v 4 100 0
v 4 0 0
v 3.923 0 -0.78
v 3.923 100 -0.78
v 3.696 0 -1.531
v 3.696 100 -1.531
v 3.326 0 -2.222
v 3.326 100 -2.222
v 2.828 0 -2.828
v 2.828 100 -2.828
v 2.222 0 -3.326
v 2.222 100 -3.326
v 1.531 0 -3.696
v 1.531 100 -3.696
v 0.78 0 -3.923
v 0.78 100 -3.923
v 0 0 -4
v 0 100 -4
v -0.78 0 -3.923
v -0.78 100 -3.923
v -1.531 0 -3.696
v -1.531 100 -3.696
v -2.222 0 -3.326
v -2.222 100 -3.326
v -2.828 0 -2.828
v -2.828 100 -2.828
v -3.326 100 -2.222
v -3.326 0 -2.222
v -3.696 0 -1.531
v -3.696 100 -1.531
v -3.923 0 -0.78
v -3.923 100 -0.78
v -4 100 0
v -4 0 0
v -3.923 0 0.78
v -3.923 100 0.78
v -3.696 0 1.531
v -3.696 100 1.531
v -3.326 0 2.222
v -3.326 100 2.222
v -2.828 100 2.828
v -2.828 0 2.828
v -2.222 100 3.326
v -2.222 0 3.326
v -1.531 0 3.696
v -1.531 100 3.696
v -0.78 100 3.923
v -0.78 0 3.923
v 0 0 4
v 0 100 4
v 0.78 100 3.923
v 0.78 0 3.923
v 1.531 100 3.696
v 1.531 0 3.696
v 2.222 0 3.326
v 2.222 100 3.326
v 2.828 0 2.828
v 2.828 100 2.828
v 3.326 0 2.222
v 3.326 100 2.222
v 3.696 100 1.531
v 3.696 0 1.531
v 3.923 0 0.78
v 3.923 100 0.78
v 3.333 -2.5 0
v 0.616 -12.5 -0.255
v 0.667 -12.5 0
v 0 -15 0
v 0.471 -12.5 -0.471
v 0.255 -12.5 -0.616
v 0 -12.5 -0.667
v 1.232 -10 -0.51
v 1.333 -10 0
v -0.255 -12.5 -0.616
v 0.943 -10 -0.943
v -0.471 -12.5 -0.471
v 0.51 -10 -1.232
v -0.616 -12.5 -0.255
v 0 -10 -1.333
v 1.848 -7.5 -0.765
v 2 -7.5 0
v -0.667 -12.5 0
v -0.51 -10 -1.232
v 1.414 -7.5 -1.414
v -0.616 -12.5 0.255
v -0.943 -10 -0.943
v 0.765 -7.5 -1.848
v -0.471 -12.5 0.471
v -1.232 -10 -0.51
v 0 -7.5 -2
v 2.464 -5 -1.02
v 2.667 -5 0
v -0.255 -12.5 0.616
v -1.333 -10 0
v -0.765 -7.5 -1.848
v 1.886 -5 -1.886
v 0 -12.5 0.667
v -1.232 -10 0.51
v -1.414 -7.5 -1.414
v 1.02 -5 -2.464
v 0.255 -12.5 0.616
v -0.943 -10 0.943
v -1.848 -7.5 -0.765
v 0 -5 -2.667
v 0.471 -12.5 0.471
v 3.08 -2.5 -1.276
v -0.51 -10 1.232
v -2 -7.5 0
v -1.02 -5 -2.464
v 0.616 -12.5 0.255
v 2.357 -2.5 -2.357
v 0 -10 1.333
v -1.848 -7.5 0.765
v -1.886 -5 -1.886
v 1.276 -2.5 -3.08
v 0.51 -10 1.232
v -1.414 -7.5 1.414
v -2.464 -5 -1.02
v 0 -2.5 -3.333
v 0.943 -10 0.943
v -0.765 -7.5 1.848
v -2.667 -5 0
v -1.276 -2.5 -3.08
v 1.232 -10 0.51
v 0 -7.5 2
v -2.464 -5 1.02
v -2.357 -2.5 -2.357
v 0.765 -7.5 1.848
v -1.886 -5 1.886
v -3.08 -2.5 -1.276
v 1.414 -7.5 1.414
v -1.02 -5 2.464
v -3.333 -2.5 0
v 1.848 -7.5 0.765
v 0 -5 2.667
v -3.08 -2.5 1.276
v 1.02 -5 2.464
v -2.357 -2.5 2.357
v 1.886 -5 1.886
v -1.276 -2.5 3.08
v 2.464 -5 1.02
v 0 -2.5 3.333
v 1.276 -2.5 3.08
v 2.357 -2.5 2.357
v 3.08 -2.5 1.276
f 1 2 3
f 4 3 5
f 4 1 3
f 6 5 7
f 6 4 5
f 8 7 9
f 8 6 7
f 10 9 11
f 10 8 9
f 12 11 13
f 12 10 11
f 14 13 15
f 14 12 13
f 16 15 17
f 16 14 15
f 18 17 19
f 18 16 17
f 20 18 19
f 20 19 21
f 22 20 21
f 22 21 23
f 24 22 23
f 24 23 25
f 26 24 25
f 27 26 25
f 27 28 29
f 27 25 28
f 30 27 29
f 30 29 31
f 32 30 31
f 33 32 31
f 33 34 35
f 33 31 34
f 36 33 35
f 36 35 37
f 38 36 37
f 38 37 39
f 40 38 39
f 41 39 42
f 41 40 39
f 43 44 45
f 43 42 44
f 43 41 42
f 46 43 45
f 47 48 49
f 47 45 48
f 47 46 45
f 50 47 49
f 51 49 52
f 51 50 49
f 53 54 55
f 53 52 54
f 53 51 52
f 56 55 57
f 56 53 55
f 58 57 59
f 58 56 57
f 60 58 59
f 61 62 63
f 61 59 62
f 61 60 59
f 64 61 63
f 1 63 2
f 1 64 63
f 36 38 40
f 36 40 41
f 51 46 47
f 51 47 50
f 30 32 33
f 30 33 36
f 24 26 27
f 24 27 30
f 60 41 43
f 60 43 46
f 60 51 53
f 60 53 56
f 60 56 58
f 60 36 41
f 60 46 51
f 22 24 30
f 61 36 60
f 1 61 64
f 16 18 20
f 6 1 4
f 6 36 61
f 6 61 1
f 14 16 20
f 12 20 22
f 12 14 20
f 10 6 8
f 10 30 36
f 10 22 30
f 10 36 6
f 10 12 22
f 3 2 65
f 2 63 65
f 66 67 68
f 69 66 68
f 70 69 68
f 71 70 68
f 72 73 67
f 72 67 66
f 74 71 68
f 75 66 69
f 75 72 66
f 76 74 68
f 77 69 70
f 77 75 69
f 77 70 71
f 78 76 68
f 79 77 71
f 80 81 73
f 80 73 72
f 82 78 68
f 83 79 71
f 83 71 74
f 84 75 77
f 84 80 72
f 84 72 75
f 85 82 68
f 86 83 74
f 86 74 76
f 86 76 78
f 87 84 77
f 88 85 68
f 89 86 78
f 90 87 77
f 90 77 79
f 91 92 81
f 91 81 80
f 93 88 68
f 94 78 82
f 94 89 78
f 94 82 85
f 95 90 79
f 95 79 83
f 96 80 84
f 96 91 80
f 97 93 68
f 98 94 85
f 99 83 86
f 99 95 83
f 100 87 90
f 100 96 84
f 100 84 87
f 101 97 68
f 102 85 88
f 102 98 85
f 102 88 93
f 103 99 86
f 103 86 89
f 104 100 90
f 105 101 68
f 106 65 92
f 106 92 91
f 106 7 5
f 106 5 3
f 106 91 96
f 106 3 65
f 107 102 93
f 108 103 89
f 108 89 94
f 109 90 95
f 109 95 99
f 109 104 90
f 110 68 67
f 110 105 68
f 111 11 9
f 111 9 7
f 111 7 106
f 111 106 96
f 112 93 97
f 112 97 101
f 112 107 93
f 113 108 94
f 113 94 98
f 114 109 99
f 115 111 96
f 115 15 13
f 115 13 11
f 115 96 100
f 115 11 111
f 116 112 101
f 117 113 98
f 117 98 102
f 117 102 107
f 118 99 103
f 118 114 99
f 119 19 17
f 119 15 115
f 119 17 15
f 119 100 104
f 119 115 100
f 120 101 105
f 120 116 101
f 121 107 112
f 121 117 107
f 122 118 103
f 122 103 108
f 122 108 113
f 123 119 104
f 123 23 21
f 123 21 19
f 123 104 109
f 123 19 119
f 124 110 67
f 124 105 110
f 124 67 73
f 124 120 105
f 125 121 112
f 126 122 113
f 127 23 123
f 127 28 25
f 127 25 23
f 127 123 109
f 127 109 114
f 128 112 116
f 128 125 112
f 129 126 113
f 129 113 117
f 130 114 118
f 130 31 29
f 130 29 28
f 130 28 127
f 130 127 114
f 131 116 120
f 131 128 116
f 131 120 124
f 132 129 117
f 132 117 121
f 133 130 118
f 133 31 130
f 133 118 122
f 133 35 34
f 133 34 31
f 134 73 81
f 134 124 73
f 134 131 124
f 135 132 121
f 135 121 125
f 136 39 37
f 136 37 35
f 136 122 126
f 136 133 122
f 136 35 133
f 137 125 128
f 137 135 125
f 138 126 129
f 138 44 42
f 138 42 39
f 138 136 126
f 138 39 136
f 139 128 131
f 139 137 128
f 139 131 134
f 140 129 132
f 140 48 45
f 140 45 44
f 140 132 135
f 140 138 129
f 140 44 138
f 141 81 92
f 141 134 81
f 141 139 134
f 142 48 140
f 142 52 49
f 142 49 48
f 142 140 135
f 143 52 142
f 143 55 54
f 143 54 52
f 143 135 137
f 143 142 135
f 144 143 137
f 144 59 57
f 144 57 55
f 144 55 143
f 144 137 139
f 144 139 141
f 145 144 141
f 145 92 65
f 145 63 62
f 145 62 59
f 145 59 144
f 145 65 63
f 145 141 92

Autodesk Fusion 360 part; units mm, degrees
sketch "草图1" plane through (0, 0, 0) normal (1, 0, 0) x (0, 0, -1)
cylinder "圆柱体基本要素1" add diameter 8 height 100 placed x (1, 0, 0) y (0, 0, -1) z (0, 1, 0) at (0, 0, 0) makes body 1
sketch "草图3" plane through (0, 0, 0) normal (0, 0, 1) x (1, 0, 0)
  line L0 (0, 0) -> (4, 0)
  line L1 (4, 0) -> (0, -10)
  line L2 (0, -10) -> (0, 0)
  dimension "d3" = 4
sketch "草图4" plane through (0, 0, 0) normal (0, 0, 1) x (1, 0, 0)
  line L0 (0, 0) -> (4, 0)
  line L1 (0, 0) -> (0, -15)
  line L2 (0, -15) -> (4, 0)
  dimension "d5" = 4
  dimension "d6" = 15
revolve "旋转2" add sketch "草图4" angle 360 about axis through (0, 0, 0) along (0, -1, 0) separate body makes body 2
combine "合并1" operation add target body 2 tool bodies 1
